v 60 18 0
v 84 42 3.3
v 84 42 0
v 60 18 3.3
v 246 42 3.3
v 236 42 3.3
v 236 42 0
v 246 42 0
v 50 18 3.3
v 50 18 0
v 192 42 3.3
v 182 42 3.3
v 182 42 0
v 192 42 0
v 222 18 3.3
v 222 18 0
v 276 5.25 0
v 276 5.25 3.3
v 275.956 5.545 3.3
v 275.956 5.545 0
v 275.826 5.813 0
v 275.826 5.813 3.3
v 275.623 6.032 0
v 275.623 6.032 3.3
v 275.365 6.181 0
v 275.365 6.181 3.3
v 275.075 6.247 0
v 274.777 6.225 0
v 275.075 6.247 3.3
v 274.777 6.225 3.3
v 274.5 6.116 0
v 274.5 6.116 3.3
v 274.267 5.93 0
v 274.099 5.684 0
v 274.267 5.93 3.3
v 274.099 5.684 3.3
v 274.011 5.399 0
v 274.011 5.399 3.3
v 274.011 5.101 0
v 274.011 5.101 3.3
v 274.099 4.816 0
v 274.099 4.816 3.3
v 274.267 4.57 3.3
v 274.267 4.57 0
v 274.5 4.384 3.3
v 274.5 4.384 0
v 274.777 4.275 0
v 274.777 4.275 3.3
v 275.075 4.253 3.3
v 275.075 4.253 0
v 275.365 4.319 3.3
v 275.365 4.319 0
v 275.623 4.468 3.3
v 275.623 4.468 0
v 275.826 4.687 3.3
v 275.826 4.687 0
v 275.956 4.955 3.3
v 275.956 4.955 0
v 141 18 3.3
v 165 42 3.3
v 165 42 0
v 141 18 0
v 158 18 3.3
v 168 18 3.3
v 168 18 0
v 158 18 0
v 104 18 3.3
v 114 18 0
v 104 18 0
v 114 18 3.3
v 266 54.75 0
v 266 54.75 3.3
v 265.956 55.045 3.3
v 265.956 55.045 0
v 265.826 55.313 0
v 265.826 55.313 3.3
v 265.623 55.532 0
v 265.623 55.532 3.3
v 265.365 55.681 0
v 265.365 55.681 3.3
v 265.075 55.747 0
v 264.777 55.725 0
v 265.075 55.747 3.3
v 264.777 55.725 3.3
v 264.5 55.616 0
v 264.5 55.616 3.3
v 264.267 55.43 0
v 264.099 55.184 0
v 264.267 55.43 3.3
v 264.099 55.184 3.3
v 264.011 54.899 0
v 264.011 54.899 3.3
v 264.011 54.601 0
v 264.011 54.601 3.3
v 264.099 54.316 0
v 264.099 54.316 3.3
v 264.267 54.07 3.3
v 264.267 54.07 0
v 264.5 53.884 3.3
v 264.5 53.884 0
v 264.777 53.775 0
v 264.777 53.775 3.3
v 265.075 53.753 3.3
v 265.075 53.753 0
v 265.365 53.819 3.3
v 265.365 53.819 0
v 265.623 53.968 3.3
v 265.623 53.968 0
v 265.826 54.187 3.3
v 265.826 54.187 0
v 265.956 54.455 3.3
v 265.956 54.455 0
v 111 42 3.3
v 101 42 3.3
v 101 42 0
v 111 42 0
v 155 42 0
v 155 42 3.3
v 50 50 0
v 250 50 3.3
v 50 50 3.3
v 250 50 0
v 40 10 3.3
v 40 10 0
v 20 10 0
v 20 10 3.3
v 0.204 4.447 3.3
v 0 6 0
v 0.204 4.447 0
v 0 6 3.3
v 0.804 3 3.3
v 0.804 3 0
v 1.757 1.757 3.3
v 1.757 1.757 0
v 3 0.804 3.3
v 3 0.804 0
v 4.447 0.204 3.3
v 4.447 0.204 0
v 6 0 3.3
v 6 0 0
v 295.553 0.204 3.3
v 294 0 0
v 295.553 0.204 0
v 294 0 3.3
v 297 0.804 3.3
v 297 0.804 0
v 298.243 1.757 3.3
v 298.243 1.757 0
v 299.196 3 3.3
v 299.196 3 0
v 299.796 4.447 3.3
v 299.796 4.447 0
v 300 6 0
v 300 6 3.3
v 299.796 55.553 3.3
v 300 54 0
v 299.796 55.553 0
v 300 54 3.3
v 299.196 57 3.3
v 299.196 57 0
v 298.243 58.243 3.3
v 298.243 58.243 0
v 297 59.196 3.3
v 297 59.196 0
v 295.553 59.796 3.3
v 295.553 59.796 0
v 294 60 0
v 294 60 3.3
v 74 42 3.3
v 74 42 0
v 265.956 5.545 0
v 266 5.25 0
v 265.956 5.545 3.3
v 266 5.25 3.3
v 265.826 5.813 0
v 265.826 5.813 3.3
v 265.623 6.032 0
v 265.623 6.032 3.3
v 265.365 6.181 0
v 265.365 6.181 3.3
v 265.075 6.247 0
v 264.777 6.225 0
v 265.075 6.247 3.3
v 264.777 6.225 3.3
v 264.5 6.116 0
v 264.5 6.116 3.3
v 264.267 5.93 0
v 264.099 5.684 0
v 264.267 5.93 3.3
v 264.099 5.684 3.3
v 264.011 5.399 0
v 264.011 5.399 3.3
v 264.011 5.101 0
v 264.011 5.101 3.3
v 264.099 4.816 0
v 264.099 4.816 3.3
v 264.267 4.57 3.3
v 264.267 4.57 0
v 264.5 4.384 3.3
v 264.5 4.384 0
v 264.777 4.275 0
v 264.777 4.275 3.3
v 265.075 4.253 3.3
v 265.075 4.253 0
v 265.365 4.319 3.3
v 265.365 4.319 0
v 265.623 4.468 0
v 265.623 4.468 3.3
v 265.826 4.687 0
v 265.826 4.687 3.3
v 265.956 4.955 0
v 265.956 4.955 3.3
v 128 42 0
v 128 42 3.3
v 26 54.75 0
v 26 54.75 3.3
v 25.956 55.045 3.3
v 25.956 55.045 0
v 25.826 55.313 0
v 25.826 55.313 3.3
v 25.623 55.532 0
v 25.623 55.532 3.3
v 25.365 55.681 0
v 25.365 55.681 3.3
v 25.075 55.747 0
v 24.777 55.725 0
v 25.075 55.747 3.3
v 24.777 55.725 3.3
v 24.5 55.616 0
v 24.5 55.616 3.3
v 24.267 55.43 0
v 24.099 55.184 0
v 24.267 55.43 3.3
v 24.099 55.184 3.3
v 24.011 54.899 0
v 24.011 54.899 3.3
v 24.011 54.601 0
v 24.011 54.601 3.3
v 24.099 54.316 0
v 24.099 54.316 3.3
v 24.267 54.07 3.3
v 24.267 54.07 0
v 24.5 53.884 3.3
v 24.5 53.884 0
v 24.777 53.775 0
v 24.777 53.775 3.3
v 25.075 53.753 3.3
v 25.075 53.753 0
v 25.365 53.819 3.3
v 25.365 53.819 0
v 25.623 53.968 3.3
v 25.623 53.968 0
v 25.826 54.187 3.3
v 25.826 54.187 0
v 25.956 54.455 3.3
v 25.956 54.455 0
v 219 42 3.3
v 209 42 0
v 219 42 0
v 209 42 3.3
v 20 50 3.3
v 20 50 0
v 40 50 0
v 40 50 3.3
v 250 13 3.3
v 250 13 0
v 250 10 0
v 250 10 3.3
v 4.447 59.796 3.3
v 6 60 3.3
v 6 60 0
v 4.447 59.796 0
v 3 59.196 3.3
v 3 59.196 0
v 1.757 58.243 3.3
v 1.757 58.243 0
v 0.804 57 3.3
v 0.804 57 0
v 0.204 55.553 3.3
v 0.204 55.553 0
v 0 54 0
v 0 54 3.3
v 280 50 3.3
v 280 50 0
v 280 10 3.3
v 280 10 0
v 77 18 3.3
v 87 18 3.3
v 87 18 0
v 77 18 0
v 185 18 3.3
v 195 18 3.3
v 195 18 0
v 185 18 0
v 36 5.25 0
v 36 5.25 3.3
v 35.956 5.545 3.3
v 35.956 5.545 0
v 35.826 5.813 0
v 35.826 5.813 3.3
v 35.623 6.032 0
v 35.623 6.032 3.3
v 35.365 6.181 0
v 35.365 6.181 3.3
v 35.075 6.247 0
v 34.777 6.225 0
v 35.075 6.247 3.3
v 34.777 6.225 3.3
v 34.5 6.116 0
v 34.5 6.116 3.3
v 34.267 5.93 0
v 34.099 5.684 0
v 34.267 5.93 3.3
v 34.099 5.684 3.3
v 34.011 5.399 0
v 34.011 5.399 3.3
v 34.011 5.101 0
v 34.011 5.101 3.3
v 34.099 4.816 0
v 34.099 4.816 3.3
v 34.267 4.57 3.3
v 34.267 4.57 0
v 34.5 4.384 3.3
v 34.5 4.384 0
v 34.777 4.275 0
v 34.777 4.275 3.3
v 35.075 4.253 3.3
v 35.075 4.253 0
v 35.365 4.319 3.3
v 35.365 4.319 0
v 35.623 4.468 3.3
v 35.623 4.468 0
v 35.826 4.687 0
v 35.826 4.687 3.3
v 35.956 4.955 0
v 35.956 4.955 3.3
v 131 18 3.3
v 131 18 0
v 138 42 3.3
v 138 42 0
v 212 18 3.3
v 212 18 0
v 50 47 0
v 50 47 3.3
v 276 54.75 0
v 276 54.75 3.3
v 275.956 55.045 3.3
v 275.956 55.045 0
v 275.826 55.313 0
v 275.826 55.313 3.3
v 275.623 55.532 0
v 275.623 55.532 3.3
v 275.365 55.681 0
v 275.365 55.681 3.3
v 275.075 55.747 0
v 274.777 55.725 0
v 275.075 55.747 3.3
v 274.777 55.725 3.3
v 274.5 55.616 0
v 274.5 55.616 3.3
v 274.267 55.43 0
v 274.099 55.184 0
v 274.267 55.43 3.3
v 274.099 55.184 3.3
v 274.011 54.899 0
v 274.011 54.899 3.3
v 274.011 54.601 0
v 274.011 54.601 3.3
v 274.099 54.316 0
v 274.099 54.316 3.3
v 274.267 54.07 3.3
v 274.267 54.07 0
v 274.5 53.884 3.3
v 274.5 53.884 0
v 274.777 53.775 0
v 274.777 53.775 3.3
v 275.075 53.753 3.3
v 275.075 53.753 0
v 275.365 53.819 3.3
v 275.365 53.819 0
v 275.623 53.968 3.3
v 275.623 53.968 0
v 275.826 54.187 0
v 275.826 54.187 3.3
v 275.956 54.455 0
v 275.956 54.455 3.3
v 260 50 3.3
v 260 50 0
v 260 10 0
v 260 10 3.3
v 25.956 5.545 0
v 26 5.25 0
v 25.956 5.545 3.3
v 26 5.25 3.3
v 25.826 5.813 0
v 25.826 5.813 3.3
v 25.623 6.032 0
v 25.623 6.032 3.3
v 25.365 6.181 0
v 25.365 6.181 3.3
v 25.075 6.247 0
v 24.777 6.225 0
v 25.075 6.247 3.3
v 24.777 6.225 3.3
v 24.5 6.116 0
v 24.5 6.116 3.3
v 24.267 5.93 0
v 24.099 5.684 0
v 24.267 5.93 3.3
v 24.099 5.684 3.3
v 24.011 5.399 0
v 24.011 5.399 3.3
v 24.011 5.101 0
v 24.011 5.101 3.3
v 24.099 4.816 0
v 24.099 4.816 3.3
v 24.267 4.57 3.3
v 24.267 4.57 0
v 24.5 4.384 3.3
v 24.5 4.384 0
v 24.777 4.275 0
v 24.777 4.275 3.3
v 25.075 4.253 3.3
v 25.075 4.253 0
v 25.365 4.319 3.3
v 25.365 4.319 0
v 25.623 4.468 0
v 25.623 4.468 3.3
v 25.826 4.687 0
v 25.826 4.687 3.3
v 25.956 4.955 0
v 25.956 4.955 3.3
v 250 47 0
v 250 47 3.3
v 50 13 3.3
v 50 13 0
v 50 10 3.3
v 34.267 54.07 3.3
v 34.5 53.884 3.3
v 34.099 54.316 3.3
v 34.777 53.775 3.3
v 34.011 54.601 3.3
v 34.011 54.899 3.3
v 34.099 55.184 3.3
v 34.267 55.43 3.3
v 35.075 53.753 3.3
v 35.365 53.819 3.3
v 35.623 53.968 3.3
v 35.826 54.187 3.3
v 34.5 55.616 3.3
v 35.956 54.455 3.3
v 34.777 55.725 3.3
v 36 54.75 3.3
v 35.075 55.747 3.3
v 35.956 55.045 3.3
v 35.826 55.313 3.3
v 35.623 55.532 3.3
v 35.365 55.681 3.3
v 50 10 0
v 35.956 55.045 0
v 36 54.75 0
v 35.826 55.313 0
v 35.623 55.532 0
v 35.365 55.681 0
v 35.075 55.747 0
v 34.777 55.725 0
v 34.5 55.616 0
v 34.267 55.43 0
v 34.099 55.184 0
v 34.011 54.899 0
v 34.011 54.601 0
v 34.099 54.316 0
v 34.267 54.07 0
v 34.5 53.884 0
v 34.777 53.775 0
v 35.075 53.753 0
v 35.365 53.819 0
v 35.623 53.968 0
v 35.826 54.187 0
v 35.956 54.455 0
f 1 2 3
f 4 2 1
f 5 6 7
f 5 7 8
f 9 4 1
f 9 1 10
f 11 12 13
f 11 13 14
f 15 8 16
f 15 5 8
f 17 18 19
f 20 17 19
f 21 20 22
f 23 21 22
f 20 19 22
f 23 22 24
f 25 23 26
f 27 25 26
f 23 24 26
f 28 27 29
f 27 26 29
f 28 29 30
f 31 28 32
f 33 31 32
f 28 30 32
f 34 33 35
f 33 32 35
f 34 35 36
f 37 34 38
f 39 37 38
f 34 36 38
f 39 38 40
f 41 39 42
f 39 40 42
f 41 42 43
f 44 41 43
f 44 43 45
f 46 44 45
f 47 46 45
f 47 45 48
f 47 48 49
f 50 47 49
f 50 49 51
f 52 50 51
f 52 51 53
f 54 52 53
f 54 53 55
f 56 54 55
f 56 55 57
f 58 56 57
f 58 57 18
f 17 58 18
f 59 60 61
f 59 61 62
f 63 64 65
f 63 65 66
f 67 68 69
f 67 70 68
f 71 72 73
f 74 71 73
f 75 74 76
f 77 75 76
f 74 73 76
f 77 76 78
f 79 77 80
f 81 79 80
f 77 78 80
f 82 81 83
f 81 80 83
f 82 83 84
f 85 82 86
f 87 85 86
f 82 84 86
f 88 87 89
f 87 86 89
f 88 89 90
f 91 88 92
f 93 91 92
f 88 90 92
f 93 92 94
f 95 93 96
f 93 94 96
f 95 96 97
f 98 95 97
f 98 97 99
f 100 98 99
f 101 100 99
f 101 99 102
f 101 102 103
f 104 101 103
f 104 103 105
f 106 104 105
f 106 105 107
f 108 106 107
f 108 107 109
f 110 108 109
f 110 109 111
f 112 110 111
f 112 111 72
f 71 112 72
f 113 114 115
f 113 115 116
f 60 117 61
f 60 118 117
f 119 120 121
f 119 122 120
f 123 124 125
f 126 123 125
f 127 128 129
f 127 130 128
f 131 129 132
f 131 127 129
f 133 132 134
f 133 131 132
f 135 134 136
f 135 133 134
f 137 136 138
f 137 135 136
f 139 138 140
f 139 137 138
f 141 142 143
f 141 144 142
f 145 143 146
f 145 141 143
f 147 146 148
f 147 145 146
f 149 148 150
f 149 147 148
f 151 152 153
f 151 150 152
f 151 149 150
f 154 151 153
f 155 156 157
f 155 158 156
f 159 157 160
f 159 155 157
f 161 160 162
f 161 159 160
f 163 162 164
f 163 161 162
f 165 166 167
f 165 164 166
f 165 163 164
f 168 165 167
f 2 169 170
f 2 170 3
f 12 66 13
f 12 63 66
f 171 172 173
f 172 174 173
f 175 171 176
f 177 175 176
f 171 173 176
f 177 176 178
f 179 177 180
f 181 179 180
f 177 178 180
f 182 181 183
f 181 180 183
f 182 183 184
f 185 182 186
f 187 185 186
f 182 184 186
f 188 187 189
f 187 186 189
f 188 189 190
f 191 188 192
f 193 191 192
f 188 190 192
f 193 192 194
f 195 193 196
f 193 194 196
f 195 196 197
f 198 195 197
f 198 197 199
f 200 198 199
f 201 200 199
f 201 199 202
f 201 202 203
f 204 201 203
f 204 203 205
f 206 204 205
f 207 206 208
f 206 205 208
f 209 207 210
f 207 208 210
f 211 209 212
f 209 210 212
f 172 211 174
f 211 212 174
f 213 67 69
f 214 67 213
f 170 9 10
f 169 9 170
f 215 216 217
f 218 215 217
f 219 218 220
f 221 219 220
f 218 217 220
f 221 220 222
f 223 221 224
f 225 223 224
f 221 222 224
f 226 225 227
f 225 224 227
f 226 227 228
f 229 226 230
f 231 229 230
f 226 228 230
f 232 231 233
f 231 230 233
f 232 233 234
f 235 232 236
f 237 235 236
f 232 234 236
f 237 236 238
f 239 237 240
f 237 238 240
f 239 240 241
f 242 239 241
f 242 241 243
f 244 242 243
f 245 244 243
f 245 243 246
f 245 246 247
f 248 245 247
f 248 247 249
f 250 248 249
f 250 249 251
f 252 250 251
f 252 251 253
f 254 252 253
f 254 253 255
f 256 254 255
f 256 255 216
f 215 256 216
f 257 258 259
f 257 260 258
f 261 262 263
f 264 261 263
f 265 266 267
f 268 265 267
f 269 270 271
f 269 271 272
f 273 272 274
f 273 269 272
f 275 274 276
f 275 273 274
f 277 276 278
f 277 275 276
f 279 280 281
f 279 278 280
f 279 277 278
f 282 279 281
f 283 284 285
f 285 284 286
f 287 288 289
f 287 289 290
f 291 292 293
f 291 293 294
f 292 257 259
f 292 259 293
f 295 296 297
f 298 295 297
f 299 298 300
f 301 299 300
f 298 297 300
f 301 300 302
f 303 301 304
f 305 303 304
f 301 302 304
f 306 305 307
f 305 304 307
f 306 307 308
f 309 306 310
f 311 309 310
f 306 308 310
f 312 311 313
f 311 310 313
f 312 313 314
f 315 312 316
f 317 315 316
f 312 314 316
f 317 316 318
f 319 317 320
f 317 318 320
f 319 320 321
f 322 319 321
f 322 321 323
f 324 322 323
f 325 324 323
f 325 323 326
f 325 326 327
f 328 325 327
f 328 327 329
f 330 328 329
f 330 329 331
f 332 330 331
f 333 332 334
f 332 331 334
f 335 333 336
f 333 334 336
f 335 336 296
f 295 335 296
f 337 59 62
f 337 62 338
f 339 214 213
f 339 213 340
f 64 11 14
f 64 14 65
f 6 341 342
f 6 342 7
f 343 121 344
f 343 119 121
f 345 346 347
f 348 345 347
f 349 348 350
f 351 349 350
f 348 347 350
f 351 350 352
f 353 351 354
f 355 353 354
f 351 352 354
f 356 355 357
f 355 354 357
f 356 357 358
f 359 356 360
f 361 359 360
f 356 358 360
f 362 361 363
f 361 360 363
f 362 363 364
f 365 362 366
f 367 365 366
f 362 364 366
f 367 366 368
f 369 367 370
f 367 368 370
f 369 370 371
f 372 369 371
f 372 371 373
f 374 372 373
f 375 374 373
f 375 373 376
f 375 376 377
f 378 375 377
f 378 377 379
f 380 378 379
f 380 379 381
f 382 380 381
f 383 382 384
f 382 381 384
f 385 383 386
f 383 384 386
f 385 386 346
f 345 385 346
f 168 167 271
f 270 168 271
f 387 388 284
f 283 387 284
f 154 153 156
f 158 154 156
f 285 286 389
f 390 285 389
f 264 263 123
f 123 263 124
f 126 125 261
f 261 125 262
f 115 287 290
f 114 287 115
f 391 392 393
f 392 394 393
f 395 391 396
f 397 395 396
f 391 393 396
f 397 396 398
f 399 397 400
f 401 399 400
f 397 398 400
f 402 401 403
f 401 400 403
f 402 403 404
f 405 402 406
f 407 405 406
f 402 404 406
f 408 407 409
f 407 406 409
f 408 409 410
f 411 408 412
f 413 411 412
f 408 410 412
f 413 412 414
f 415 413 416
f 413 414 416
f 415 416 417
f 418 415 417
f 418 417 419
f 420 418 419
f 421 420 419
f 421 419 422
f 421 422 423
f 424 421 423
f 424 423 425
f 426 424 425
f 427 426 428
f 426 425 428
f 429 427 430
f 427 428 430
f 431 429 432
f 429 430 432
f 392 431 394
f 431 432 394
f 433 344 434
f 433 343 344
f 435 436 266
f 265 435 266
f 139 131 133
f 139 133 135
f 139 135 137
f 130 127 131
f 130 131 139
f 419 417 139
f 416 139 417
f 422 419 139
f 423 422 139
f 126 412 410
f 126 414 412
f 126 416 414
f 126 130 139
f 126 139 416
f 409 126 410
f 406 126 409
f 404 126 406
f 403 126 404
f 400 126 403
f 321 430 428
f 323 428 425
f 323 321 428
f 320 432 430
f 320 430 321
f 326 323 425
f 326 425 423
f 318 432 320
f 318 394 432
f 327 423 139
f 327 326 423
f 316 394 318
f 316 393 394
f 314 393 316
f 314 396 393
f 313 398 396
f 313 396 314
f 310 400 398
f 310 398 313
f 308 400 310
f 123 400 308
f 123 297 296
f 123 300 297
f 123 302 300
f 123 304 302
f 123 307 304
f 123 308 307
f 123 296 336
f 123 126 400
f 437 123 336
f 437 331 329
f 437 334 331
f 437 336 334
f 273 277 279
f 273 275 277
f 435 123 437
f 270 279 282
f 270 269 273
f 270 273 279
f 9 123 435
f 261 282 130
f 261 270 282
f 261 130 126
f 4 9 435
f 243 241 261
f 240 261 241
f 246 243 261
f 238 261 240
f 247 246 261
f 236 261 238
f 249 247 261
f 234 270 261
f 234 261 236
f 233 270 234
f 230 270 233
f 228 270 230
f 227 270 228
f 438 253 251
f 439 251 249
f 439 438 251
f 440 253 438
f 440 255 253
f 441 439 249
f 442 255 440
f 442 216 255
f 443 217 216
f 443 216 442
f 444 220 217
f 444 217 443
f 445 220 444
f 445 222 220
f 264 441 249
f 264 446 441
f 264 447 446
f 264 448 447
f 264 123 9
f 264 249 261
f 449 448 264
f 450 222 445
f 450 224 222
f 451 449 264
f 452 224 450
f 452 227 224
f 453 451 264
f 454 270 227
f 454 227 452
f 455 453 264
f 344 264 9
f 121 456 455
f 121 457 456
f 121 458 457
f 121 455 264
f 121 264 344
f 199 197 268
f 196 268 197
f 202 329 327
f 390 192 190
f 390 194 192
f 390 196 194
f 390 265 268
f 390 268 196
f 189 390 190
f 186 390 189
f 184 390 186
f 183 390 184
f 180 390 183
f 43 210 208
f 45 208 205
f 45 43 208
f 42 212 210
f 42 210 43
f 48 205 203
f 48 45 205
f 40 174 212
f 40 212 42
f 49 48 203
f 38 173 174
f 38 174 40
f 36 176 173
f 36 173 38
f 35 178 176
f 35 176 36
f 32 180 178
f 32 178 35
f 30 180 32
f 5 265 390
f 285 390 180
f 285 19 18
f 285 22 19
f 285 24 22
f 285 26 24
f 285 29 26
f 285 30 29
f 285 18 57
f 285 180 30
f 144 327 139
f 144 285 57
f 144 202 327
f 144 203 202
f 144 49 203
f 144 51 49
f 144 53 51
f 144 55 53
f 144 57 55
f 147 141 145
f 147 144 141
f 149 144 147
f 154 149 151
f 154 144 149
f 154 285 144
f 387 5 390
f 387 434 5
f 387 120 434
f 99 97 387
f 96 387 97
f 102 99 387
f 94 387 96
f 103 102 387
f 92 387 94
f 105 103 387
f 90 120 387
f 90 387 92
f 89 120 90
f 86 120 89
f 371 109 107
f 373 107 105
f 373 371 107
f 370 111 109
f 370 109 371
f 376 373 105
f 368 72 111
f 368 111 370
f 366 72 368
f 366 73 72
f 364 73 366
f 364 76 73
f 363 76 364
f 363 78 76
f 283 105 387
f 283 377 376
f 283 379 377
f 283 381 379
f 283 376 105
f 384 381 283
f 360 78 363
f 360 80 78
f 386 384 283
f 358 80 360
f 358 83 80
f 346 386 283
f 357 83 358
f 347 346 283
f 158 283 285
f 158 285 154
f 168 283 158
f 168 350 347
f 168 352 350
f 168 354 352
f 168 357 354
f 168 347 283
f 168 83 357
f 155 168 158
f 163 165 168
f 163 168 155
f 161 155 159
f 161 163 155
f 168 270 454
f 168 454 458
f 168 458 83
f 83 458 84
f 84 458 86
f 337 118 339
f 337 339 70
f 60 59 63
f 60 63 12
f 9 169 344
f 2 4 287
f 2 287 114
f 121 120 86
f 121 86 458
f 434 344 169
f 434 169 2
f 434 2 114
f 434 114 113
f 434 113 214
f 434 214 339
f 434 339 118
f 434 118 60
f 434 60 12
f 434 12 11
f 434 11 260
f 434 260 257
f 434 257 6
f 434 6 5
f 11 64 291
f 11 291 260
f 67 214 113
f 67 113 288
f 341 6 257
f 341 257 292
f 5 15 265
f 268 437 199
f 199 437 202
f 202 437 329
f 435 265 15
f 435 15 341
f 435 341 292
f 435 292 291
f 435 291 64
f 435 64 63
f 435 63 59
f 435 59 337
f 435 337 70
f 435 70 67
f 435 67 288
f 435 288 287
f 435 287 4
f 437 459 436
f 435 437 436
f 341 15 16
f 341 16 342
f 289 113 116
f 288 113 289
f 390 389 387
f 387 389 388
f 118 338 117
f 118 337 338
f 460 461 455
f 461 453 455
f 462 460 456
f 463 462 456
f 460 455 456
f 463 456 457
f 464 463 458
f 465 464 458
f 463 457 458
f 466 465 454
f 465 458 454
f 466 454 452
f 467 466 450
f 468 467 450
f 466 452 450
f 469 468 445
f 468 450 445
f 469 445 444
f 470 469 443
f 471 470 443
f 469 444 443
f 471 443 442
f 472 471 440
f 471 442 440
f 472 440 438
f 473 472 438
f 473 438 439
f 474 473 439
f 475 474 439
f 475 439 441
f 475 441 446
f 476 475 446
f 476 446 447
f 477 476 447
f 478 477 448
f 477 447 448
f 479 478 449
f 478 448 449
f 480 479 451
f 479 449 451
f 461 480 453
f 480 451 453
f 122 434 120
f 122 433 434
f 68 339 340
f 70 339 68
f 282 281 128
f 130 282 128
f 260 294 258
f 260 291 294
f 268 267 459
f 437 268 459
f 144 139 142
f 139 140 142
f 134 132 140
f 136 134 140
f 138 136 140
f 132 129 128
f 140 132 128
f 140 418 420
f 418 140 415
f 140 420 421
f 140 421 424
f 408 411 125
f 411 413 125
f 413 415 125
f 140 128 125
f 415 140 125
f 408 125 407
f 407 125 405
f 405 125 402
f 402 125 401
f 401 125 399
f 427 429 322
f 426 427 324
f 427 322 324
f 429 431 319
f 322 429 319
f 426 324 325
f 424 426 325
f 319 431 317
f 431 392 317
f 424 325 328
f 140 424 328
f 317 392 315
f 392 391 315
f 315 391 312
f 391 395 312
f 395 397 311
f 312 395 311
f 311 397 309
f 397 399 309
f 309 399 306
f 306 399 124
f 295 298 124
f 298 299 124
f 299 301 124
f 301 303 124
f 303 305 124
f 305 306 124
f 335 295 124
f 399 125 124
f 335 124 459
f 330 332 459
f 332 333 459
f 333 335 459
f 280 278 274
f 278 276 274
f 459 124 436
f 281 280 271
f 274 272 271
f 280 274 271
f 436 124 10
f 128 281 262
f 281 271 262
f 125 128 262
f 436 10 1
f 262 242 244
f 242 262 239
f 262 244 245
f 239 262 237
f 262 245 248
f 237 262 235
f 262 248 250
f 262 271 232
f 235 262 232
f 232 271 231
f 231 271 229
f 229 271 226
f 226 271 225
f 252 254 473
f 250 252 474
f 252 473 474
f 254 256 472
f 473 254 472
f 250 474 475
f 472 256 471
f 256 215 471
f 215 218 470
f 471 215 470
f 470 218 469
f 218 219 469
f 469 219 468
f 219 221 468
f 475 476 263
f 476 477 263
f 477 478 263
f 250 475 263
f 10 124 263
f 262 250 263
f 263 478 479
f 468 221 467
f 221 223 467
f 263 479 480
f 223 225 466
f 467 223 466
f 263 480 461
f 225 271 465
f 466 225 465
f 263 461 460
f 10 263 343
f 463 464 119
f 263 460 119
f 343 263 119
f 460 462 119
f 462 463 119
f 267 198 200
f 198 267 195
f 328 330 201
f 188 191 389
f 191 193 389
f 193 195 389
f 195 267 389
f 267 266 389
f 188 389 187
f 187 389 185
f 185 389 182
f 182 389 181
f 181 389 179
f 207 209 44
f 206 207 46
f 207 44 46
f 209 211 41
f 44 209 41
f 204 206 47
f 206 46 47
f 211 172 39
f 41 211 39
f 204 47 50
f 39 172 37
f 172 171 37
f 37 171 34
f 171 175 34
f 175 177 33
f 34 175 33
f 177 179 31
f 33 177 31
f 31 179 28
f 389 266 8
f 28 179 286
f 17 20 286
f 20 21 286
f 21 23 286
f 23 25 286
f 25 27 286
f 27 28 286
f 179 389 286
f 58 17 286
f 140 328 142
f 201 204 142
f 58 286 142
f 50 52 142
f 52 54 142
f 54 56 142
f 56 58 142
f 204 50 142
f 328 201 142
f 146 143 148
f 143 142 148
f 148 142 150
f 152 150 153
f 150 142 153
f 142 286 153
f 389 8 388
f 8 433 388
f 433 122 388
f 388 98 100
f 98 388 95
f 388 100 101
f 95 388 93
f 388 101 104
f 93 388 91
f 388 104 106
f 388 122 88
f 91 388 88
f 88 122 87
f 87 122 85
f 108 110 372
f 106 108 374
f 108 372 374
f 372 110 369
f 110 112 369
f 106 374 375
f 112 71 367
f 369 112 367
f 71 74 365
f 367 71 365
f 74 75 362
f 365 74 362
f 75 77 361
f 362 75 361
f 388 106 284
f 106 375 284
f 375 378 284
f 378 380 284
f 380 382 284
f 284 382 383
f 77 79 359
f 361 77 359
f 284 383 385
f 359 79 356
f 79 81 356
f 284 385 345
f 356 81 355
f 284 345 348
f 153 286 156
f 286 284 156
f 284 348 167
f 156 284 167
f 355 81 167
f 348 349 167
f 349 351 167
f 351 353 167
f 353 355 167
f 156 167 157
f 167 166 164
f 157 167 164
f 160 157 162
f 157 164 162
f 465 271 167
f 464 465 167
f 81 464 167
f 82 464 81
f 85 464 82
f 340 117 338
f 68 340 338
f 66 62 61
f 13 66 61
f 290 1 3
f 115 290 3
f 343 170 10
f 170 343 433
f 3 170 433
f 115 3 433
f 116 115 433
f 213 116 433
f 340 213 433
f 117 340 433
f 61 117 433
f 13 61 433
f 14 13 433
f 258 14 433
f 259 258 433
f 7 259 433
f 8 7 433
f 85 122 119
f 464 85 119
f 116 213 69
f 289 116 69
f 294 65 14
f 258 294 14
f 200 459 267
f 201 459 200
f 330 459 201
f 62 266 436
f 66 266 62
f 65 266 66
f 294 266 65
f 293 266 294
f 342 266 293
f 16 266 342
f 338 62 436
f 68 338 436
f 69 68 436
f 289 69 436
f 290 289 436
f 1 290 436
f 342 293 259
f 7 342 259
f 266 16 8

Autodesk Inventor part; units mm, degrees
ref_plane "YZ Plane" through (0, 0, 0) normal (1, 0, 0) x (0, 1, 0)
ref_plane "XZ Plane" through (0, 0, 0) normal (0, 1, 0) x (-1, 0, 0)
ref_plane "XY Plane" through (0, 0, 0) normal (0, 0, 1) x (1, 0, 0)
sketch "Sketch7" plane through (0, 0, 0) normal (0, 0, 1) x (1, 0, 0)
  line L0 (0, 0) -> (300, 0)
  line L1 (300, 0) -> (300, 60)
  line L2 (300, 60) -> (0, 60)
  line L3 (0, 60) -> (0, 0)
  line L4 (50, 13) -> (250, 13)
  line L5 (250, 13) -> (250, 10)
  line L6 (250, 10) -> (50, 10)
  line L7 (50, 10) -> (50, 13)
  line L8 (150, 13) -> (150, 10) construction
  line L9 (20, 50) -> (40, 50)
  line L10 (40, 50) -> (40, 10)
  line L11 (40, 10) -> (20, 10)
  line L12 (20, 10) -> (20, 50)
  line L13 (260, 50) -> (280, 50)
  line L14 (280, 50) -> (280, 10)
  line L15 (280, 10) -> (260, 10)
  line L16 (260, 10) -> (260, 50)
  line L17 (50, 47) -> (250, 47)
  line L18 (250, 47) -> (250, 50)
  line L19 (250, 50) -> (50, 50)
  line L20 (50, 50) -> (50, 47)
  point P0 (50, 48.5)
  point P1 (50, 11.5)
  dimension "d152" = 300
  dimension "d153" = 60
  dimension "d154" = 200
  dimension "d158" = 150
  dimension "d159" = 3
  dimension "d160" = 10
  dimension "d161" = 40
  dimension "d162" = 20
  dimension "d163" = 20
  dimension "d164" = 20
  dimension "d165" = 10
  dimension "d166" = 10
  dimension "d168" = 10
extrude "Extrusion7" add sketch "Sketch7" along normal blind 3.3
fillet "Fillet1" radius 6 4 edges at (0, 60, 1.65) (0, 0, 1.65) (300, 60, 1.65) (300, 0, 1.65)
sketch "Sketch9" plane through (0, 0, 3.3) normal (0, 0, 1) x (1, 0, 0)
  arc A0 (294, 0) -> (300, 6) centre (294, 6) ccw projected
  line L0 (300, 6) -> (300, 54) projected
  arc A1 (300, 54) -> (294, 60) centre (294, 54) ccw projected
  line L1 (294, 60) -> (6, 60) projected
  arc A2 (6, 60) -> (0, 54) centre (6, 54) ccw projected
  line L2 (0, 54) -> (0, 6) projected
  arc A3 (0, 6) -> (6, 0) centre (6, 6) ccw projected
  line L3 (6, 0) -> (294, 0) projected
  line L4 (280, 50) -> (280, 10) projected
  line L5 (280, 10) -> (260, 10) projected
  line L6 (260, 10) -> (260, 50) projected
  line L7 (260, 50) -> (280, 50) projected
  line L8 (40, 50) -> (40, 10) projected
  line L9 (40, 10) -> (20, 10) projected
  line L10 (20, 10) -> (20, 50) projected
  line L11 (20, 50) -> (40, 50) projected
  line L12 (50, 47) -> (50, 50) projected
  line L13 (50, 50) -> (250, 50) projected
  line L14 (250, 50) -> (250, 47) projected
  line L15 (250, 47) -> (50, 47) projected
  line L16 (250, 13) -> (250, 10) projected
  line L17 (250, 10) -> (50, 10) projected
  line L18 (50, 10) -> (50, 13) projected
  line L19 (50, 13) -> (250, 13) projected
  line L20 (50, 18) -> (74, 42)
  line L21 (74, 42) -> (84, 42)
  line L22 (84, 42) -> (60, 18)
  line L23 (60, 18) -> (50, 18)
  point P0 (0, 0)
  dimension "d172" = 45
  dimension "d173" = 10
  dimension "d175" = 5
  dimension "d182" = 5
extrude "Extrusion8" cut sketch "Sketch9" against normal blind 3.3 contours L20 L21 L22 L23
pattern_linear "Rectangular Pattern1" count 7 spacing 27 along (1, 0, 0) of "Extrusion8"
sketch "Sketch10" plane through (0, 0, 3.3) normal (0, 0, 1) x (1, 0, 0)
  line L0 (20, 10) -> (20, 50) projected
  line L1 (20, 50) -> (40, 50) projected
  line L2 (40, 50) -> (40, 10) projected
  line L3 (40, 10) -> (20, 10) projected
  circle A0 centre (25, 54.75) radius 1
  circle A1 centre (35, 54.75) radius 1
  circle A2 centre (25, 5.25) radius 1
  circle A3 centre (35, 5.25) radius 1
  line L4 (260, 10) -> (260, 50) projected
  line L5 (280, 50) -> (280, 10) projected
  line L6 (260, 50) -> (280, 50) projected
  line L7 (280, 10) -> (260, 10) projected
  circle A4 centre (265, 54.75) radius 1
  circle A5 centre (275, 54.75) radius 1
  circle A6 centre (265, 5.25) radius 1
  circle A7 centre (275, 5.25) radius 1
  point P0 (0, 0)
  dimension "d183" = 2
  dimension "d184" = 5
  dimension "d185" = 10
  dimension "d186" = 5
  dimension "d187" = 10
  dimension "d188" = 4.75
  dimension "d189" = 4.75
  dimension "d192" = 2
  dimension "d194" = 10
  dimension "d196" = 10
  dimension "d202" = 5
extrude "Extrusion9" cut sketch "Sketch10" against normal blind 10 contours A0 | A1 | A2 | A3 | A4 | A5 | A6 | A7
equation "\"soporte\" = 60"
equation "\"largo_base\" = 200"
properties part number "Cuerpo - LateralPrueba" material "ABS Plastic"
